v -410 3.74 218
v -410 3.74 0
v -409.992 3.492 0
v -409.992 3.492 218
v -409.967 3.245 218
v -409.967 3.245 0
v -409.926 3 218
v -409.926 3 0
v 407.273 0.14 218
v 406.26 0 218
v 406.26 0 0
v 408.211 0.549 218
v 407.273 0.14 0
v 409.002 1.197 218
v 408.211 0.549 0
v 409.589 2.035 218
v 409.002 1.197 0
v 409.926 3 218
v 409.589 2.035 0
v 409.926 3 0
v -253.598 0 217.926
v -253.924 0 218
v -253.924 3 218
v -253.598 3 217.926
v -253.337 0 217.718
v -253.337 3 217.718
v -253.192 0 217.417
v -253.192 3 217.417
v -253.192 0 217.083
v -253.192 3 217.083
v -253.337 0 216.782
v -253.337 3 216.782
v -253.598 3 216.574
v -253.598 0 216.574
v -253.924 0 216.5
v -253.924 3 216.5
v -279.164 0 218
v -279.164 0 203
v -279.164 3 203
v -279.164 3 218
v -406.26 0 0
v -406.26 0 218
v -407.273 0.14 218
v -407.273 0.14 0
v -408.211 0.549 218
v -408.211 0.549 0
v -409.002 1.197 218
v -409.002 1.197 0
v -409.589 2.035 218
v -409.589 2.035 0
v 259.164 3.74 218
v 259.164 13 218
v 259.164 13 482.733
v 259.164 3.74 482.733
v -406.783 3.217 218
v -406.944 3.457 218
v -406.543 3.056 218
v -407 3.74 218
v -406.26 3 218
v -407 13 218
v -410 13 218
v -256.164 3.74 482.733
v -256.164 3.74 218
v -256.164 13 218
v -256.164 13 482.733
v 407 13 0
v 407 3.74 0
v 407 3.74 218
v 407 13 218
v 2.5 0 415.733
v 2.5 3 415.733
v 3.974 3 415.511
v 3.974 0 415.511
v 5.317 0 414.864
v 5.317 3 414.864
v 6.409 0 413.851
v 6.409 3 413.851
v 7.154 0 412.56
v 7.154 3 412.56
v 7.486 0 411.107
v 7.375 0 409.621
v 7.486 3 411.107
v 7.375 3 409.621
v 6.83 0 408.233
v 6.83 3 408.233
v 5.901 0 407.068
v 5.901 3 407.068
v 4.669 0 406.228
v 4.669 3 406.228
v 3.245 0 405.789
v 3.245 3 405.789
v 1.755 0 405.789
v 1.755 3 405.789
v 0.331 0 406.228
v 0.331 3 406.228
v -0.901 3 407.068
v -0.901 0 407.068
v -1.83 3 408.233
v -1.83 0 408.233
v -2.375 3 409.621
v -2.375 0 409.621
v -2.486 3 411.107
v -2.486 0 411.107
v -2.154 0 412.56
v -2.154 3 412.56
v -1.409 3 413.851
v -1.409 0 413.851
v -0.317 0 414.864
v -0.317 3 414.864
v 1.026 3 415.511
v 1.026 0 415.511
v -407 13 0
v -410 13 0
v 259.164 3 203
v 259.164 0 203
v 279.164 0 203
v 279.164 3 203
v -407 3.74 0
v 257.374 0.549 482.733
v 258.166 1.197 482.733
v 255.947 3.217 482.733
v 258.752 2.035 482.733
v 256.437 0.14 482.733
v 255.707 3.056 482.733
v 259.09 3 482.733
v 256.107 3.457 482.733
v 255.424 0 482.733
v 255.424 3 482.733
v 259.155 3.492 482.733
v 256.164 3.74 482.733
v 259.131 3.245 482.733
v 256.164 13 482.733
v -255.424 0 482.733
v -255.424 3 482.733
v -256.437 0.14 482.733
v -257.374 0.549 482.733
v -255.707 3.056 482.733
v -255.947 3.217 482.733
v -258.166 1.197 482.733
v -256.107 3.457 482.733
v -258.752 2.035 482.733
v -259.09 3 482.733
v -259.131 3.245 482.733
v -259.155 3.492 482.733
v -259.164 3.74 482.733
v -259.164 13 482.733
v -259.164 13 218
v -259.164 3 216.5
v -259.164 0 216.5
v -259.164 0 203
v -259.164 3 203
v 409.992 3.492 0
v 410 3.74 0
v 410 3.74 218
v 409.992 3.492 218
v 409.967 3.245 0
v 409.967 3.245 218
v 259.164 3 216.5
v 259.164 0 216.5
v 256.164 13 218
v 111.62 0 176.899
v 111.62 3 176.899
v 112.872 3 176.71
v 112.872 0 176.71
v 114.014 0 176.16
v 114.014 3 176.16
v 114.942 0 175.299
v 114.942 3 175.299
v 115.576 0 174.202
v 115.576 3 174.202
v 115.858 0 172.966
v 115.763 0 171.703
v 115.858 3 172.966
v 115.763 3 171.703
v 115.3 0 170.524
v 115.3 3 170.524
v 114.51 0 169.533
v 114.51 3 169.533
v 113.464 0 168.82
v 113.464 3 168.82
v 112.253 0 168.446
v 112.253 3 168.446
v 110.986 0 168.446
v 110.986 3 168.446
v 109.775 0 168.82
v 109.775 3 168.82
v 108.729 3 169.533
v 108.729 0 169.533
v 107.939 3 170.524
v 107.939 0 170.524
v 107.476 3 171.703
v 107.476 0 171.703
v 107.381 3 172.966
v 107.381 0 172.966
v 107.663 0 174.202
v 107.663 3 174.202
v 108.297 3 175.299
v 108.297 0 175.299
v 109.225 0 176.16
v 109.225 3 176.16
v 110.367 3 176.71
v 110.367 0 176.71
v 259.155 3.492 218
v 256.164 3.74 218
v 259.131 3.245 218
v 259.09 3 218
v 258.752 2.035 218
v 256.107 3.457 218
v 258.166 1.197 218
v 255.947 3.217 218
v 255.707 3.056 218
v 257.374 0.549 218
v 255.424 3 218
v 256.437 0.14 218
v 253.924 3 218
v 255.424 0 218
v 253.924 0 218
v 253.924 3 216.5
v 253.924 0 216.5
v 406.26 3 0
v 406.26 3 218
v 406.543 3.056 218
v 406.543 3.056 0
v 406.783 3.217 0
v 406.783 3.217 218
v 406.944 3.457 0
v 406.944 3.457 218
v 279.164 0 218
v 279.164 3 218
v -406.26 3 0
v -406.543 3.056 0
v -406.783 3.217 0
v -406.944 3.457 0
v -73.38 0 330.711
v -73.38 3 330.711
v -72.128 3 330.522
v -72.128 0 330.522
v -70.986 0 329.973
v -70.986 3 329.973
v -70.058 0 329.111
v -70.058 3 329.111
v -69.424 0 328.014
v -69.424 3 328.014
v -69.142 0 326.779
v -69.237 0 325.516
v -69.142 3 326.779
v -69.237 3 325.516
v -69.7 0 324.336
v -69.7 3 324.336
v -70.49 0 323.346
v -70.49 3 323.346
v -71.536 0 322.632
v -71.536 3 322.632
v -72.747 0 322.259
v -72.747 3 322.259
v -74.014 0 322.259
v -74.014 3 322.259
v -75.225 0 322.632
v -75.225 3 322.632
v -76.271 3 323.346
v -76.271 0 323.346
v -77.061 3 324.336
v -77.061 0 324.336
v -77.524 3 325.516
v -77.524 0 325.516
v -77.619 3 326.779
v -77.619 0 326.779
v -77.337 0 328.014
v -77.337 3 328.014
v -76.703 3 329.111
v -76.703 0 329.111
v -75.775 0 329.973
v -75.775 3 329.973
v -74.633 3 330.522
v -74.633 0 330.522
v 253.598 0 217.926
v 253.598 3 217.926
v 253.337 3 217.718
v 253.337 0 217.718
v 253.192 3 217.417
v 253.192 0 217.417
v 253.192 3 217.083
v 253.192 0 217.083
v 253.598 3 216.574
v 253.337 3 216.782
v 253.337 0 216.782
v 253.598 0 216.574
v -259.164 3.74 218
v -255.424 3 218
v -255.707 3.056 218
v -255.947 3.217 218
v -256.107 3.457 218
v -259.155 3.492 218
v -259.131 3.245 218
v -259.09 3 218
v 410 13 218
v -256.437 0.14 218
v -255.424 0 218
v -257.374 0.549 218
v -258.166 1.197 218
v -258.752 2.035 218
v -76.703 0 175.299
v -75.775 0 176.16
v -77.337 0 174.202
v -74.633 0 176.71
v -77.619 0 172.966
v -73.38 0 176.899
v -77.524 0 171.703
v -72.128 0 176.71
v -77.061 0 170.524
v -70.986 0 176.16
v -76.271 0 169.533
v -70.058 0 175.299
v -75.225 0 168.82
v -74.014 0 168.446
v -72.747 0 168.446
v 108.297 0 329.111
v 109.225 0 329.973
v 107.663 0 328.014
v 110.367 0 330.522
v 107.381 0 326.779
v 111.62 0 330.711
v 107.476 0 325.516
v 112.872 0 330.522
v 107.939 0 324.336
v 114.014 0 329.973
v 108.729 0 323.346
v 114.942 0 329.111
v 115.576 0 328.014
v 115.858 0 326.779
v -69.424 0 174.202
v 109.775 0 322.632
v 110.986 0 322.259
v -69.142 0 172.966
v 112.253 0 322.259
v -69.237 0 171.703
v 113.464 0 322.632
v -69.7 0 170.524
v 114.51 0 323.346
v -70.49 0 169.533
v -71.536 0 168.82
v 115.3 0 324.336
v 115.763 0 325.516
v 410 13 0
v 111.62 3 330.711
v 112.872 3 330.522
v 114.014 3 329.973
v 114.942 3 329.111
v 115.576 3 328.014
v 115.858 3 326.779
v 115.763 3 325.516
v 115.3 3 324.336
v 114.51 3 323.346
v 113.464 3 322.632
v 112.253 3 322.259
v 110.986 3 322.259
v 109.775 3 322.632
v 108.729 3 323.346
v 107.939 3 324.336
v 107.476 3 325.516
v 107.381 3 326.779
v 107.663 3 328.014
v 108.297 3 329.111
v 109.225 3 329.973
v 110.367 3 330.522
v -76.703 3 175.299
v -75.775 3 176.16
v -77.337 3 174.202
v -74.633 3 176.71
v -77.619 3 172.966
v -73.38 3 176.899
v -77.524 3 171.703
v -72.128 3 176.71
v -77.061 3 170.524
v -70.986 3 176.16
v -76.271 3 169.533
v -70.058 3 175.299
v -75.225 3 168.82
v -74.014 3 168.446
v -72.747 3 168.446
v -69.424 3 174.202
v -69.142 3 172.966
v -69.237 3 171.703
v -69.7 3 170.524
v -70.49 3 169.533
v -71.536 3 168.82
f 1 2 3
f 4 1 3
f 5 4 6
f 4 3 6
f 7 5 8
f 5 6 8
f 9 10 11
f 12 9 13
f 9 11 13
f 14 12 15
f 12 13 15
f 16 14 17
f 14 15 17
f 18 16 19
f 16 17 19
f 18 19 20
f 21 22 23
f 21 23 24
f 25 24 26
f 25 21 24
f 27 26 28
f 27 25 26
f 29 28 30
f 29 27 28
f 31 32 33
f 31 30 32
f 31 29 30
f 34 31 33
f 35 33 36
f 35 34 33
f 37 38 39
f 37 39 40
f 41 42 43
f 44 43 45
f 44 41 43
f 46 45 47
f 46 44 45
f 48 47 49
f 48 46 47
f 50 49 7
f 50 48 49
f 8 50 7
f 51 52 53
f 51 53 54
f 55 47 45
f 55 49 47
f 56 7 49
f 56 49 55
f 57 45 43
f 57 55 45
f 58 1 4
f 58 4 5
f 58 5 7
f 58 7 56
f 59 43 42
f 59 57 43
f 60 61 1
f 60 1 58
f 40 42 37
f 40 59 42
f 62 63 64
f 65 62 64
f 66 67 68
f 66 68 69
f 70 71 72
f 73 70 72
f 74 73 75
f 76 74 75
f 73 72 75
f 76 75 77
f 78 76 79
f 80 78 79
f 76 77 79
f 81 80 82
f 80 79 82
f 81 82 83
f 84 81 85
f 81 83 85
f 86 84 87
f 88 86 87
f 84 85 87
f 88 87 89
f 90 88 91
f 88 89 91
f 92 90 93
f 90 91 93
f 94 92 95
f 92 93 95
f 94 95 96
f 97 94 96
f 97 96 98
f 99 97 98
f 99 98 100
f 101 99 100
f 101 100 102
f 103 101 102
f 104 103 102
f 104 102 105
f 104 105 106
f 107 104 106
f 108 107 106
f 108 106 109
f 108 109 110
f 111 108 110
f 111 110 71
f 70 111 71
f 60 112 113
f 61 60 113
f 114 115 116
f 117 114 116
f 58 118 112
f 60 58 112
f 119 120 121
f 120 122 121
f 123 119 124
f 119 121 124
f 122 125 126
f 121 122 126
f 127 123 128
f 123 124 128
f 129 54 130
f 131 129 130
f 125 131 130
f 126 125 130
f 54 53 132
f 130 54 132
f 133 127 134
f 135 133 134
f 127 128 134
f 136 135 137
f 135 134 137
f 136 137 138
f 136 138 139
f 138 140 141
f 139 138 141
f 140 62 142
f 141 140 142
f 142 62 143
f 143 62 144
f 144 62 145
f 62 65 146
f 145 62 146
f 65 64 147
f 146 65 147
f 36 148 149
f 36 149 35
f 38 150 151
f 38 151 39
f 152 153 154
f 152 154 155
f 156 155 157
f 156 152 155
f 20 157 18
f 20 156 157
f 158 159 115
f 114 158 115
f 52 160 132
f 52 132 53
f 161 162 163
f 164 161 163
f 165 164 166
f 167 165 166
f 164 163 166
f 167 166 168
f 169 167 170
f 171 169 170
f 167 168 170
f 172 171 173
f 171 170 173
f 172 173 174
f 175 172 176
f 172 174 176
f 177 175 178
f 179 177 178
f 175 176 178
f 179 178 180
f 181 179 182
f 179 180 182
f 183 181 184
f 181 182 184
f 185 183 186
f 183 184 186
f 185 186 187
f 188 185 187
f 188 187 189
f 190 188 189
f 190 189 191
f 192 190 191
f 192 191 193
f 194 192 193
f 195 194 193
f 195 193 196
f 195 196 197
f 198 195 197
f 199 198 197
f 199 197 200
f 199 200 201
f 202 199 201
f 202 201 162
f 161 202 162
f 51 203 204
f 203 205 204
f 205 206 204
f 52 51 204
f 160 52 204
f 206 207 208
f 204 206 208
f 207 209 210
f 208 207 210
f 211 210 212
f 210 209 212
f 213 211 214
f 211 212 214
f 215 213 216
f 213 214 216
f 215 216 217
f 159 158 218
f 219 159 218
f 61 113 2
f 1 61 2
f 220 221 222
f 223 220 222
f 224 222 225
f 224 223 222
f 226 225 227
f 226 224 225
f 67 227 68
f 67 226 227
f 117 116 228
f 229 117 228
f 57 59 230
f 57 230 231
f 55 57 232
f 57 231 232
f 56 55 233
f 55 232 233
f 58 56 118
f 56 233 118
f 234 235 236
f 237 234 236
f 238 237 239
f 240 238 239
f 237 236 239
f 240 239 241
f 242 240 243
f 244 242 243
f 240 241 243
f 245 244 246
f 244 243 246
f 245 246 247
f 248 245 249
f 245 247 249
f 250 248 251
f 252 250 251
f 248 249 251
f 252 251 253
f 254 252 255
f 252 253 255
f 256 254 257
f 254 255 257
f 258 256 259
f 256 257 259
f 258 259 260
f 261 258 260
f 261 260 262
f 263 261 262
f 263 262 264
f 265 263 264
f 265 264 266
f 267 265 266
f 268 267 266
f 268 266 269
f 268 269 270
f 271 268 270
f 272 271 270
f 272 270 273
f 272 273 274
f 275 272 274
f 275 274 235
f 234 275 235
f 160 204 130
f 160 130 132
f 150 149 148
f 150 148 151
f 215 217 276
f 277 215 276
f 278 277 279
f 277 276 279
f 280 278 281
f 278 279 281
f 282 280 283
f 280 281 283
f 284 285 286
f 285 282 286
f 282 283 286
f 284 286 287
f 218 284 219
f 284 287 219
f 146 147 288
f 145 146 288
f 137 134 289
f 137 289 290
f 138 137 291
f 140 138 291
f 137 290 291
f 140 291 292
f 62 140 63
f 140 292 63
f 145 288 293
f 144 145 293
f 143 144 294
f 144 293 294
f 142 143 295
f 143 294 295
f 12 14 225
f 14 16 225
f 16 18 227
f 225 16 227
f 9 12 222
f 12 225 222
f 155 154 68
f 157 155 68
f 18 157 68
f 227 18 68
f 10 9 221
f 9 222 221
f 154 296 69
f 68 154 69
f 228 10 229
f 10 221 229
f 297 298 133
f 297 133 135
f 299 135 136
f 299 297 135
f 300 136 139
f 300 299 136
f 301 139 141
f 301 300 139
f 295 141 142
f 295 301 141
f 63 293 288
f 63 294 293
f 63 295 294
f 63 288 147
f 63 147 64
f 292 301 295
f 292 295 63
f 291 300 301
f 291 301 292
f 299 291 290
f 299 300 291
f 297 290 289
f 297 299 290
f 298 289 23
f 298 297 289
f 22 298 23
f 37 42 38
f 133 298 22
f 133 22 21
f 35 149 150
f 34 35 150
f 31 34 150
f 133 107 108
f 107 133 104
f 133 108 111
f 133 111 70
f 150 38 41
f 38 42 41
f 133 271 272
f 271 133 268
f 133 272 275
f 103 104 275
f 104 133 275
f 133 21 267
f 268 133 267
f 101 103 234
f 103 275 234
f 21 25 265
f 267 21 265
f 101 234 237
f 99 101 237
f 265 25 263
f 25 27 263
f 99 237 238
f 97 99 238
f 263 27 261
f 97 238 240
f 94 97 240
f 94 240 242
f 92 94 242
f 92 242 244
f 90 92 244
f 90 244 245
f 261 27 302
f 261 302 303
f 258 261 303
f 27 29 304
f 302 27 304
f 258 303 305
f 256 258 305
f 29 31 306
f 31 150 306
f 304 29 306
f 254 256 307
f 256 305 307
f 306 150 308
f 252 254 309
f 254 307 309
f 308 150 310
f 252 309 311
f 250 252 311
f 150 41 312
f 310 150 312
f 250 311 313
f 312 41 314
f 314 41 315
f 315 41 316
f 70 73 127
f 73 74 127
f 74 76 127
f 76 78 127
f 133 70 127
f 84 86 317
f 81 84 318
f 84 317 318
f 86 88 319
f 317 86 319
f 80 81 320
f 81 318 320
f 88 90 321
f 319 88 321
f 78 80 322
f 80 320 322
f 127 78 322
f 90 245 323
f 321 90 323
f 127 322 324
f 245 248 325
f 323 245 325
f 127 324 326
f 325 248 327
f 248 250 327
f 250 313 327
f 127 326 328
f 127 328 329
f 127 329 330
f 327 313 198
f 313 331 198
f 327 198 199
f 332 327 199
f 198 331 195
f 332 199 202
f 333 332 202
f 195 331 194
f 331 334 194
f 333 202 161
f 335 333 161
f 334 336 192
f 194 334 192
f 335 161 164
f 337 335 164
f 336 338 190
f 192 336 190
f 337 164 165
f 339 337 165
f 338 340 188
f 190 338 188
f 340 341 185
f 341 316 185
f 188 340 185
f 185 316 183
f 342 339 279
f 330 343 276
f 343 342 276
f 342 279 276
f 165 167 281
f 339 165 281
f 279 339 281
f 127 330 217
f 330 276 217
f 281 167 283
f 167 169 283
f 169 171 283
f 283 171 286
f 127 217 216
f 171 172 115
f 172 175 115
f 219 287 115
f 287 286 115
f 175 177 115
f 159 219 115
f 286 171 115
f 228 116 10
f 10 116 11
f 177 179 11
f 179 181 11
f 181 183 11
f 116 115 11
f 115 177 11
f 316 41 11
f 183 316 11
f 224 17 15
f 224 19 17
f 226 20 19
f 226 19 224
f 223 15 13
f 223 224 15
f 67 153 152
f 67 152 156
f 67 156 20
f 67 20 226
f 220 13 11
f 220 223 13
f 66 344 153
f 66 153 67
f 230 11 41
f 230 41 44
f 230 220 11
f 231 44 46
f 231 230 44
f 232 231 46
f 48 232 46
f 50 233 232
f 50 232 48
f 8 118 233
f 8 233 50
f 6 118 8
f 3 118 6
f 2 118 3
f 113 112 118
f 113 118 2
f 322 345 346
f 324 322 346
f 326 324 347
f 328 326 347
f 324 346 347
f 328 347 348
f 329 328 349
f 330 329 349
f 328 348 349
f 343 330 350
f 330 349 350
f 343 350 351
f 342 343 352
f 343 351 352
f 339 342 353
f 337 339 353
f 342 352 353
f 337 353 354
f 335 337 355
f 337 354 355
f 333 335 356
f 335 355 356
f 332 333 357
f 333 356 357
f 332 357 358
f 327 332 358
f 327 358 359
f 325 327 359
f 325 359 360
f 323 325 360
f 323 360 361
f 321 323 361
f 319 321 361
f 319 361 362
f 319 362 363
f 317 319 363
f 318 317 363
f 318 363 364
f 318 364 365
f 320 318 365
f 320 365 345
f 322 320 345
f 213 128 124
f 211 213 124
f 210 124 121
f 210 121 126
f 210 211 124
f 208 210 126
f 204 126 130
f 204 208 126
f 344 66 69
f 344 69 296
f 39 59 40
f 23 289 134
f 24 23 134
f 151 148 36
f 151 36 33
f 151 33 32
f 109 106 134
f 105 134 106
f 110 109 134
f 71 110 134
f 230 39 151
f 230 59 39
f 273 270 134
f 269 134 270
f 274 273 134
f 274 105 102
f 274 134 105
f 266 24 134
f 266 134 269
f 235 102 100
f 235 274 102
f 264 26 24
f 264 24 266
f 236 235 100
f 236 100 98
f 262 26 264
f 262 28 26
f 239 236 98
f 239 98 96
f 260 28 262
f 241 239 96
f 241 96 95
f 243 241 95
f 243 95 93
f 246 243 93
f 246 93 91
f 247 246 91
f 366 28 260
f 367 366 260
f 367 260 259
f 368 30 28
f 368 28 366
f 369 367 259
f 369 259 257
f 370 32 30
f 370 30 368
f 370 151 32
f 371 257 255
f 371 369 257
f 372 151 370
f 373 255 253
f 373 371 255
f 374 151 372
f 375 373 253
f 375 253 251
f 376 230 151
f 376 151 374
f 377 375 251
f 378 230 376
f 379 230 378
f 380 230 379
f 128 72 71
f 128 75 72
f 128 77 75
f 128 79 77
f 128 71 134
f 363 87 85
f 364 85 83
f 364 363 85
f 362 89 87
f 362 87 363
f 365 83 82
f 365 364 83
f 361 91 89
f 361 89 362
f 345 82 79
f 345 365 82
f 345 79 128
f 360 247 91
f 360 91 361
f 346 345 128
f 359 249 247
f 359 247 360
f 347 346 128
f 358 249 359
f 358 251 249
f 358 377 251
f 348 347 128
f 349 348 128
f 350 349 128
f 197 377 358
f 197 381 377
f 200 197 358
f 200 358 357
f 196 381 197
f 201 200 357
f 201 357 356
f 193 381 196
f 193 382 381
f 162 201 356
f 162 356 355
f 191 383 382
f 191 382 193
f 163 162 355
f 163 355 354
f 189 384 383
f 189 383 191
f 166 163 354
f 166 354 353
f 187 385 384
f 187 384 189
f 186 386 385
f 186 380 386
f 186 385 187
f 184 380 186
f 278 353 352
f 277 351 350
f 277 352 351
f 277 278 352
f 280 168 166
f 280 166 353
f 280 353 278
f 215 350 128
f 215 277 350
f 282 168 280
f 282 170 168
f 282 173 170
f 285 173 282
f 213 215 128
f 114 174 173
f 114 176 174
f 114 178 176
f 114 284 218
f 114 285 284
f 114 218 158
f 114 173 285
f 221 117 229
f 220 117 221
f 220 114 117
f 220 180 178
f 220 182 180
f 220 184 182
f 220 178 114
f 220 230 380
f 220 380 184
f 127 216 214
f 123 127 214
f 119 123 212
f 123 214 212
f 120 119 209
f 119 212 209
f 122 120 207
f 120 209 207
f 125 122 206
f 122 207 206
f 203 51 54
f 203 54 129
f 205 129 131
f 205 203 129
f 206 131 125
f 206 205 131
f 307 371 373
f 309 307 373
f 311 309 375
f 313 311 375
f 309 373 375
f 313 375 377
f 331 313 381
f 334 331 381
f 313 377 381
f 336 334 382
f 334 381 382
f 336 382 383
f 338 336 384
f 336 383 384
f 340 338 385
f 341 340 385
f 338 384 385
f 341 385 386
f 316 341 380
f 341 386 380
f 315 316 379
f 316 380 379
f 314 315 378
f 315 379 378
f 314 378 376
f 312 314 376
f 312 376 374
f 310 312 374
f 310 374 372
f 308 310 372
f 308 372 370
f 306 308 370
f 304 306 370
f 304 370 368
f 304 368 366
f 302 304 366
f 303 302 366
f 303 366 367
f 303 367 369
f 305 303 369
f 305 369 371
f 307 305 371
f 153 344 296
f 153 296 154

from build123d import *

# Parameters (mm, degrees)
SM_BASE_FLANGE_1_DEPTH   = 3
SM_START                 = 216.5
SM_EDGE_FLANGE_1_DEPTH   = 266.233197448
SM_EDGE_FLANGE_1_2_DEPTH = 216.5
SM_START_2               = 218
SM_EDGE_FLANGE_1_3_DEPTH = 264.733197448
SM_EDGE_FLANGE_1_4_DEPTH = 218
SM_START_3               = -1
SM_EDGE_FLANGE_1_5_DEPTH = 4.74
SKETCH_14_R              = 5
SKETCH_14_R_2            = 4.25
CUT_EXTRUDE_1_DEPTH      = 10


with BuildPart() as part:
    # Базовая кромка1: sheet metal written as solids
    # Sketch 1 → Базовая кромка1 (new body)
    with BuildSketch(Plane(origin=(0, 0, 0), x_dir=(1, 0, 0), z_dir=(0, 1, 0))):
        Polygon((-410, 0), (0, 0), (0, -482.733197448), (-259.163690552, -482.733197448), (-259.163690552, -203), (-279.163690552, -203), (-279.163690552, -218), (-410, -218), align=None)
    extrude(amount=SM_BASE_FLANGE_1_DEPTH)

    # Ребро-кромка1: read off the stored shape, not the designer's step
    # Ребро-кромка1 outline → Ребро-кромка1 (cut)
    with BuildSketch(Plane.XY.offset(SM_START)):
        with BuildLine():
            ThreePointArc((-255.423690552, 0), (-257.792234409, 0.845591597), (-259.089751108, 3))
            Line((-259.089751108, 3), (-259.163690552, 3))
            Line((-259.163690552, 3), (-259.163690552, 0))
            Line((-259.163690552, 0), (-255.423690552, 0))
        make_face()
        with BuildLine():
            Line((-410, 0), (-406.26, 0))
            ThreePointArc((-406.26, 0), (-408.628543857, 0.845591597), (-409.926060556, 3))
            Line((-409.926060556, 3), (-410, 3))
            Line((-410, 3), (-410, 0))
        make_face()
    extrude(amount=SM_EDGE_FLANGE_1_DEPTH, mode=Mode.SUBTRACT)

    # Sm Edge Flange 1 2 outline → Sm Edge Flange 1 2 (cut)
    with BuildSketch(Plane.XY):
        with BuildLine():
            Line((-410, 0), (-406.26, 0))
            ThreePointArc((-406.26, 0), (-408.628543857, 0.845591597), (-409.926060556, 3))
            Line((-409.926060556, 3), (-410, 3))
            Line((-410, 3), (-410, 0))
        make_face()
    extrude(amount=SM_EDGE_FLANGE_1_2_DEPTH, mode=Mode.SUBTRACT)

    # Sm Edge Flange 1 3 outline → Sm Edge Flange 1 3 (add)
    with BuildSketch(Plane.XY.offset(SM_START_2)):
        with BuildLine():
            Line((-259.163690552, 13), (-259.163690552, 3.74))
            ThreePointArc((-259.163690552, 3.74), (-259.145159783, 3.368157614), (-259.089751108, 3))
            Line((-259.089751108, 3), (-255.423690552, 3))
            ThreePointArc((-255.423690552, 3), (-255.94694957, 3.216740982), (-256.163690552, 3.74))
            Line((-256.163690552, 3.74), (-256.163690552, 13))
            Line((-256.163690552, 13), (-259.163690552, 13))
        make_face()
    extrude(amount=SM_EDGE_FLANGE_1_3_DEPTH)

    # Sm Edge Flange 1 4 outline → Sm Edge Flange 1 4 (add)
    with BuildSketch(Plane.XY):
        with BuildLine():
            Line((-409.926060556, 3), (-406.26, 3))
            ThreePointArc((-406.26, 3), (-406.783259018, 3.216740982), (-407, 3.74))
            Line((-407, 3.74), (-407, 13))
            Line((-407, 13), (-410, 13))
            Line((-410, 13), (-410, 3.74))
            ThreePointArc((-410, 3.74), (-409.981469231, 3.368157614), (-409.926060556, 3))
        make_face()
    extrude(amount=SM_EDGE_FLANGE_1_4_DEPTH)

    # Sm Edge Flange 1 5 outline → Sm Edge Flange 1 5 (cut)
    with BuildSketch(Plane(origin=(0, 0, 0), x_dir=(1, 0, 0), z_dir=(0, 1, 0)).offset(SM_START_3)):
        with BuildLine():
            Line((-260, -218), (-253.923690552, -218))
            ThreePointArc((-253.923690552, -218), (-253.173690552, -217.25), (-253.923690552, -216.5))
            Line((-253.923690552, -216.5), (-260, -216.5))
            Line((-260, -216.5), (-260, -218))
        make_face()
    extrude(amount=SM_EDGE_FLANGE_1_5_DEPTH, mode=Mode.SUBTRACT)

    # Зеркальное отражение1: part across plane


with BuildPart() as part_1:
    add(part.part)
    add(part.part.mirror(Plane(origin=(0, 3, 0), x_dir=(0, 0, 1), z_dir=(-1, 0, 0))))

    # Эскиз14 → Вырез-Вытянуть1 (cut)
    with BuildSketch(Plane(origin=(0, 3, 0), x_dir=(1, 0, 0), z_dir=(0, 1, 0))):
        with Locations(Location((2.5, -410.733197448, 0), (0, 0, 270))):
            Circle(SKETCH_14_R)
        with Locations(Location((111.6195, -172.648893261, 0), (0, 0, 270))):
            Circle(SKETCH_14_R_2)
        with Locations(Location((111.6195, -326.461239213, 0), (0, 0, 270))):
            Circle(SKETCH_14_R_2)
        with Locations(Location((-73.3805, -326.461239213, 0), (0, 0, 270))):
            Circle(SKETCH_14_R_2)
        with Locations(Location((-73.3805, -172.648893261, 0), (0, 0, 270))):
            Circle(SKETCH_14_R_2)
    extrude(amount=-CUT_EXTRUDE_1_DEPTH, mode=Mode.SUBTRACT)


solid = part_1.part
